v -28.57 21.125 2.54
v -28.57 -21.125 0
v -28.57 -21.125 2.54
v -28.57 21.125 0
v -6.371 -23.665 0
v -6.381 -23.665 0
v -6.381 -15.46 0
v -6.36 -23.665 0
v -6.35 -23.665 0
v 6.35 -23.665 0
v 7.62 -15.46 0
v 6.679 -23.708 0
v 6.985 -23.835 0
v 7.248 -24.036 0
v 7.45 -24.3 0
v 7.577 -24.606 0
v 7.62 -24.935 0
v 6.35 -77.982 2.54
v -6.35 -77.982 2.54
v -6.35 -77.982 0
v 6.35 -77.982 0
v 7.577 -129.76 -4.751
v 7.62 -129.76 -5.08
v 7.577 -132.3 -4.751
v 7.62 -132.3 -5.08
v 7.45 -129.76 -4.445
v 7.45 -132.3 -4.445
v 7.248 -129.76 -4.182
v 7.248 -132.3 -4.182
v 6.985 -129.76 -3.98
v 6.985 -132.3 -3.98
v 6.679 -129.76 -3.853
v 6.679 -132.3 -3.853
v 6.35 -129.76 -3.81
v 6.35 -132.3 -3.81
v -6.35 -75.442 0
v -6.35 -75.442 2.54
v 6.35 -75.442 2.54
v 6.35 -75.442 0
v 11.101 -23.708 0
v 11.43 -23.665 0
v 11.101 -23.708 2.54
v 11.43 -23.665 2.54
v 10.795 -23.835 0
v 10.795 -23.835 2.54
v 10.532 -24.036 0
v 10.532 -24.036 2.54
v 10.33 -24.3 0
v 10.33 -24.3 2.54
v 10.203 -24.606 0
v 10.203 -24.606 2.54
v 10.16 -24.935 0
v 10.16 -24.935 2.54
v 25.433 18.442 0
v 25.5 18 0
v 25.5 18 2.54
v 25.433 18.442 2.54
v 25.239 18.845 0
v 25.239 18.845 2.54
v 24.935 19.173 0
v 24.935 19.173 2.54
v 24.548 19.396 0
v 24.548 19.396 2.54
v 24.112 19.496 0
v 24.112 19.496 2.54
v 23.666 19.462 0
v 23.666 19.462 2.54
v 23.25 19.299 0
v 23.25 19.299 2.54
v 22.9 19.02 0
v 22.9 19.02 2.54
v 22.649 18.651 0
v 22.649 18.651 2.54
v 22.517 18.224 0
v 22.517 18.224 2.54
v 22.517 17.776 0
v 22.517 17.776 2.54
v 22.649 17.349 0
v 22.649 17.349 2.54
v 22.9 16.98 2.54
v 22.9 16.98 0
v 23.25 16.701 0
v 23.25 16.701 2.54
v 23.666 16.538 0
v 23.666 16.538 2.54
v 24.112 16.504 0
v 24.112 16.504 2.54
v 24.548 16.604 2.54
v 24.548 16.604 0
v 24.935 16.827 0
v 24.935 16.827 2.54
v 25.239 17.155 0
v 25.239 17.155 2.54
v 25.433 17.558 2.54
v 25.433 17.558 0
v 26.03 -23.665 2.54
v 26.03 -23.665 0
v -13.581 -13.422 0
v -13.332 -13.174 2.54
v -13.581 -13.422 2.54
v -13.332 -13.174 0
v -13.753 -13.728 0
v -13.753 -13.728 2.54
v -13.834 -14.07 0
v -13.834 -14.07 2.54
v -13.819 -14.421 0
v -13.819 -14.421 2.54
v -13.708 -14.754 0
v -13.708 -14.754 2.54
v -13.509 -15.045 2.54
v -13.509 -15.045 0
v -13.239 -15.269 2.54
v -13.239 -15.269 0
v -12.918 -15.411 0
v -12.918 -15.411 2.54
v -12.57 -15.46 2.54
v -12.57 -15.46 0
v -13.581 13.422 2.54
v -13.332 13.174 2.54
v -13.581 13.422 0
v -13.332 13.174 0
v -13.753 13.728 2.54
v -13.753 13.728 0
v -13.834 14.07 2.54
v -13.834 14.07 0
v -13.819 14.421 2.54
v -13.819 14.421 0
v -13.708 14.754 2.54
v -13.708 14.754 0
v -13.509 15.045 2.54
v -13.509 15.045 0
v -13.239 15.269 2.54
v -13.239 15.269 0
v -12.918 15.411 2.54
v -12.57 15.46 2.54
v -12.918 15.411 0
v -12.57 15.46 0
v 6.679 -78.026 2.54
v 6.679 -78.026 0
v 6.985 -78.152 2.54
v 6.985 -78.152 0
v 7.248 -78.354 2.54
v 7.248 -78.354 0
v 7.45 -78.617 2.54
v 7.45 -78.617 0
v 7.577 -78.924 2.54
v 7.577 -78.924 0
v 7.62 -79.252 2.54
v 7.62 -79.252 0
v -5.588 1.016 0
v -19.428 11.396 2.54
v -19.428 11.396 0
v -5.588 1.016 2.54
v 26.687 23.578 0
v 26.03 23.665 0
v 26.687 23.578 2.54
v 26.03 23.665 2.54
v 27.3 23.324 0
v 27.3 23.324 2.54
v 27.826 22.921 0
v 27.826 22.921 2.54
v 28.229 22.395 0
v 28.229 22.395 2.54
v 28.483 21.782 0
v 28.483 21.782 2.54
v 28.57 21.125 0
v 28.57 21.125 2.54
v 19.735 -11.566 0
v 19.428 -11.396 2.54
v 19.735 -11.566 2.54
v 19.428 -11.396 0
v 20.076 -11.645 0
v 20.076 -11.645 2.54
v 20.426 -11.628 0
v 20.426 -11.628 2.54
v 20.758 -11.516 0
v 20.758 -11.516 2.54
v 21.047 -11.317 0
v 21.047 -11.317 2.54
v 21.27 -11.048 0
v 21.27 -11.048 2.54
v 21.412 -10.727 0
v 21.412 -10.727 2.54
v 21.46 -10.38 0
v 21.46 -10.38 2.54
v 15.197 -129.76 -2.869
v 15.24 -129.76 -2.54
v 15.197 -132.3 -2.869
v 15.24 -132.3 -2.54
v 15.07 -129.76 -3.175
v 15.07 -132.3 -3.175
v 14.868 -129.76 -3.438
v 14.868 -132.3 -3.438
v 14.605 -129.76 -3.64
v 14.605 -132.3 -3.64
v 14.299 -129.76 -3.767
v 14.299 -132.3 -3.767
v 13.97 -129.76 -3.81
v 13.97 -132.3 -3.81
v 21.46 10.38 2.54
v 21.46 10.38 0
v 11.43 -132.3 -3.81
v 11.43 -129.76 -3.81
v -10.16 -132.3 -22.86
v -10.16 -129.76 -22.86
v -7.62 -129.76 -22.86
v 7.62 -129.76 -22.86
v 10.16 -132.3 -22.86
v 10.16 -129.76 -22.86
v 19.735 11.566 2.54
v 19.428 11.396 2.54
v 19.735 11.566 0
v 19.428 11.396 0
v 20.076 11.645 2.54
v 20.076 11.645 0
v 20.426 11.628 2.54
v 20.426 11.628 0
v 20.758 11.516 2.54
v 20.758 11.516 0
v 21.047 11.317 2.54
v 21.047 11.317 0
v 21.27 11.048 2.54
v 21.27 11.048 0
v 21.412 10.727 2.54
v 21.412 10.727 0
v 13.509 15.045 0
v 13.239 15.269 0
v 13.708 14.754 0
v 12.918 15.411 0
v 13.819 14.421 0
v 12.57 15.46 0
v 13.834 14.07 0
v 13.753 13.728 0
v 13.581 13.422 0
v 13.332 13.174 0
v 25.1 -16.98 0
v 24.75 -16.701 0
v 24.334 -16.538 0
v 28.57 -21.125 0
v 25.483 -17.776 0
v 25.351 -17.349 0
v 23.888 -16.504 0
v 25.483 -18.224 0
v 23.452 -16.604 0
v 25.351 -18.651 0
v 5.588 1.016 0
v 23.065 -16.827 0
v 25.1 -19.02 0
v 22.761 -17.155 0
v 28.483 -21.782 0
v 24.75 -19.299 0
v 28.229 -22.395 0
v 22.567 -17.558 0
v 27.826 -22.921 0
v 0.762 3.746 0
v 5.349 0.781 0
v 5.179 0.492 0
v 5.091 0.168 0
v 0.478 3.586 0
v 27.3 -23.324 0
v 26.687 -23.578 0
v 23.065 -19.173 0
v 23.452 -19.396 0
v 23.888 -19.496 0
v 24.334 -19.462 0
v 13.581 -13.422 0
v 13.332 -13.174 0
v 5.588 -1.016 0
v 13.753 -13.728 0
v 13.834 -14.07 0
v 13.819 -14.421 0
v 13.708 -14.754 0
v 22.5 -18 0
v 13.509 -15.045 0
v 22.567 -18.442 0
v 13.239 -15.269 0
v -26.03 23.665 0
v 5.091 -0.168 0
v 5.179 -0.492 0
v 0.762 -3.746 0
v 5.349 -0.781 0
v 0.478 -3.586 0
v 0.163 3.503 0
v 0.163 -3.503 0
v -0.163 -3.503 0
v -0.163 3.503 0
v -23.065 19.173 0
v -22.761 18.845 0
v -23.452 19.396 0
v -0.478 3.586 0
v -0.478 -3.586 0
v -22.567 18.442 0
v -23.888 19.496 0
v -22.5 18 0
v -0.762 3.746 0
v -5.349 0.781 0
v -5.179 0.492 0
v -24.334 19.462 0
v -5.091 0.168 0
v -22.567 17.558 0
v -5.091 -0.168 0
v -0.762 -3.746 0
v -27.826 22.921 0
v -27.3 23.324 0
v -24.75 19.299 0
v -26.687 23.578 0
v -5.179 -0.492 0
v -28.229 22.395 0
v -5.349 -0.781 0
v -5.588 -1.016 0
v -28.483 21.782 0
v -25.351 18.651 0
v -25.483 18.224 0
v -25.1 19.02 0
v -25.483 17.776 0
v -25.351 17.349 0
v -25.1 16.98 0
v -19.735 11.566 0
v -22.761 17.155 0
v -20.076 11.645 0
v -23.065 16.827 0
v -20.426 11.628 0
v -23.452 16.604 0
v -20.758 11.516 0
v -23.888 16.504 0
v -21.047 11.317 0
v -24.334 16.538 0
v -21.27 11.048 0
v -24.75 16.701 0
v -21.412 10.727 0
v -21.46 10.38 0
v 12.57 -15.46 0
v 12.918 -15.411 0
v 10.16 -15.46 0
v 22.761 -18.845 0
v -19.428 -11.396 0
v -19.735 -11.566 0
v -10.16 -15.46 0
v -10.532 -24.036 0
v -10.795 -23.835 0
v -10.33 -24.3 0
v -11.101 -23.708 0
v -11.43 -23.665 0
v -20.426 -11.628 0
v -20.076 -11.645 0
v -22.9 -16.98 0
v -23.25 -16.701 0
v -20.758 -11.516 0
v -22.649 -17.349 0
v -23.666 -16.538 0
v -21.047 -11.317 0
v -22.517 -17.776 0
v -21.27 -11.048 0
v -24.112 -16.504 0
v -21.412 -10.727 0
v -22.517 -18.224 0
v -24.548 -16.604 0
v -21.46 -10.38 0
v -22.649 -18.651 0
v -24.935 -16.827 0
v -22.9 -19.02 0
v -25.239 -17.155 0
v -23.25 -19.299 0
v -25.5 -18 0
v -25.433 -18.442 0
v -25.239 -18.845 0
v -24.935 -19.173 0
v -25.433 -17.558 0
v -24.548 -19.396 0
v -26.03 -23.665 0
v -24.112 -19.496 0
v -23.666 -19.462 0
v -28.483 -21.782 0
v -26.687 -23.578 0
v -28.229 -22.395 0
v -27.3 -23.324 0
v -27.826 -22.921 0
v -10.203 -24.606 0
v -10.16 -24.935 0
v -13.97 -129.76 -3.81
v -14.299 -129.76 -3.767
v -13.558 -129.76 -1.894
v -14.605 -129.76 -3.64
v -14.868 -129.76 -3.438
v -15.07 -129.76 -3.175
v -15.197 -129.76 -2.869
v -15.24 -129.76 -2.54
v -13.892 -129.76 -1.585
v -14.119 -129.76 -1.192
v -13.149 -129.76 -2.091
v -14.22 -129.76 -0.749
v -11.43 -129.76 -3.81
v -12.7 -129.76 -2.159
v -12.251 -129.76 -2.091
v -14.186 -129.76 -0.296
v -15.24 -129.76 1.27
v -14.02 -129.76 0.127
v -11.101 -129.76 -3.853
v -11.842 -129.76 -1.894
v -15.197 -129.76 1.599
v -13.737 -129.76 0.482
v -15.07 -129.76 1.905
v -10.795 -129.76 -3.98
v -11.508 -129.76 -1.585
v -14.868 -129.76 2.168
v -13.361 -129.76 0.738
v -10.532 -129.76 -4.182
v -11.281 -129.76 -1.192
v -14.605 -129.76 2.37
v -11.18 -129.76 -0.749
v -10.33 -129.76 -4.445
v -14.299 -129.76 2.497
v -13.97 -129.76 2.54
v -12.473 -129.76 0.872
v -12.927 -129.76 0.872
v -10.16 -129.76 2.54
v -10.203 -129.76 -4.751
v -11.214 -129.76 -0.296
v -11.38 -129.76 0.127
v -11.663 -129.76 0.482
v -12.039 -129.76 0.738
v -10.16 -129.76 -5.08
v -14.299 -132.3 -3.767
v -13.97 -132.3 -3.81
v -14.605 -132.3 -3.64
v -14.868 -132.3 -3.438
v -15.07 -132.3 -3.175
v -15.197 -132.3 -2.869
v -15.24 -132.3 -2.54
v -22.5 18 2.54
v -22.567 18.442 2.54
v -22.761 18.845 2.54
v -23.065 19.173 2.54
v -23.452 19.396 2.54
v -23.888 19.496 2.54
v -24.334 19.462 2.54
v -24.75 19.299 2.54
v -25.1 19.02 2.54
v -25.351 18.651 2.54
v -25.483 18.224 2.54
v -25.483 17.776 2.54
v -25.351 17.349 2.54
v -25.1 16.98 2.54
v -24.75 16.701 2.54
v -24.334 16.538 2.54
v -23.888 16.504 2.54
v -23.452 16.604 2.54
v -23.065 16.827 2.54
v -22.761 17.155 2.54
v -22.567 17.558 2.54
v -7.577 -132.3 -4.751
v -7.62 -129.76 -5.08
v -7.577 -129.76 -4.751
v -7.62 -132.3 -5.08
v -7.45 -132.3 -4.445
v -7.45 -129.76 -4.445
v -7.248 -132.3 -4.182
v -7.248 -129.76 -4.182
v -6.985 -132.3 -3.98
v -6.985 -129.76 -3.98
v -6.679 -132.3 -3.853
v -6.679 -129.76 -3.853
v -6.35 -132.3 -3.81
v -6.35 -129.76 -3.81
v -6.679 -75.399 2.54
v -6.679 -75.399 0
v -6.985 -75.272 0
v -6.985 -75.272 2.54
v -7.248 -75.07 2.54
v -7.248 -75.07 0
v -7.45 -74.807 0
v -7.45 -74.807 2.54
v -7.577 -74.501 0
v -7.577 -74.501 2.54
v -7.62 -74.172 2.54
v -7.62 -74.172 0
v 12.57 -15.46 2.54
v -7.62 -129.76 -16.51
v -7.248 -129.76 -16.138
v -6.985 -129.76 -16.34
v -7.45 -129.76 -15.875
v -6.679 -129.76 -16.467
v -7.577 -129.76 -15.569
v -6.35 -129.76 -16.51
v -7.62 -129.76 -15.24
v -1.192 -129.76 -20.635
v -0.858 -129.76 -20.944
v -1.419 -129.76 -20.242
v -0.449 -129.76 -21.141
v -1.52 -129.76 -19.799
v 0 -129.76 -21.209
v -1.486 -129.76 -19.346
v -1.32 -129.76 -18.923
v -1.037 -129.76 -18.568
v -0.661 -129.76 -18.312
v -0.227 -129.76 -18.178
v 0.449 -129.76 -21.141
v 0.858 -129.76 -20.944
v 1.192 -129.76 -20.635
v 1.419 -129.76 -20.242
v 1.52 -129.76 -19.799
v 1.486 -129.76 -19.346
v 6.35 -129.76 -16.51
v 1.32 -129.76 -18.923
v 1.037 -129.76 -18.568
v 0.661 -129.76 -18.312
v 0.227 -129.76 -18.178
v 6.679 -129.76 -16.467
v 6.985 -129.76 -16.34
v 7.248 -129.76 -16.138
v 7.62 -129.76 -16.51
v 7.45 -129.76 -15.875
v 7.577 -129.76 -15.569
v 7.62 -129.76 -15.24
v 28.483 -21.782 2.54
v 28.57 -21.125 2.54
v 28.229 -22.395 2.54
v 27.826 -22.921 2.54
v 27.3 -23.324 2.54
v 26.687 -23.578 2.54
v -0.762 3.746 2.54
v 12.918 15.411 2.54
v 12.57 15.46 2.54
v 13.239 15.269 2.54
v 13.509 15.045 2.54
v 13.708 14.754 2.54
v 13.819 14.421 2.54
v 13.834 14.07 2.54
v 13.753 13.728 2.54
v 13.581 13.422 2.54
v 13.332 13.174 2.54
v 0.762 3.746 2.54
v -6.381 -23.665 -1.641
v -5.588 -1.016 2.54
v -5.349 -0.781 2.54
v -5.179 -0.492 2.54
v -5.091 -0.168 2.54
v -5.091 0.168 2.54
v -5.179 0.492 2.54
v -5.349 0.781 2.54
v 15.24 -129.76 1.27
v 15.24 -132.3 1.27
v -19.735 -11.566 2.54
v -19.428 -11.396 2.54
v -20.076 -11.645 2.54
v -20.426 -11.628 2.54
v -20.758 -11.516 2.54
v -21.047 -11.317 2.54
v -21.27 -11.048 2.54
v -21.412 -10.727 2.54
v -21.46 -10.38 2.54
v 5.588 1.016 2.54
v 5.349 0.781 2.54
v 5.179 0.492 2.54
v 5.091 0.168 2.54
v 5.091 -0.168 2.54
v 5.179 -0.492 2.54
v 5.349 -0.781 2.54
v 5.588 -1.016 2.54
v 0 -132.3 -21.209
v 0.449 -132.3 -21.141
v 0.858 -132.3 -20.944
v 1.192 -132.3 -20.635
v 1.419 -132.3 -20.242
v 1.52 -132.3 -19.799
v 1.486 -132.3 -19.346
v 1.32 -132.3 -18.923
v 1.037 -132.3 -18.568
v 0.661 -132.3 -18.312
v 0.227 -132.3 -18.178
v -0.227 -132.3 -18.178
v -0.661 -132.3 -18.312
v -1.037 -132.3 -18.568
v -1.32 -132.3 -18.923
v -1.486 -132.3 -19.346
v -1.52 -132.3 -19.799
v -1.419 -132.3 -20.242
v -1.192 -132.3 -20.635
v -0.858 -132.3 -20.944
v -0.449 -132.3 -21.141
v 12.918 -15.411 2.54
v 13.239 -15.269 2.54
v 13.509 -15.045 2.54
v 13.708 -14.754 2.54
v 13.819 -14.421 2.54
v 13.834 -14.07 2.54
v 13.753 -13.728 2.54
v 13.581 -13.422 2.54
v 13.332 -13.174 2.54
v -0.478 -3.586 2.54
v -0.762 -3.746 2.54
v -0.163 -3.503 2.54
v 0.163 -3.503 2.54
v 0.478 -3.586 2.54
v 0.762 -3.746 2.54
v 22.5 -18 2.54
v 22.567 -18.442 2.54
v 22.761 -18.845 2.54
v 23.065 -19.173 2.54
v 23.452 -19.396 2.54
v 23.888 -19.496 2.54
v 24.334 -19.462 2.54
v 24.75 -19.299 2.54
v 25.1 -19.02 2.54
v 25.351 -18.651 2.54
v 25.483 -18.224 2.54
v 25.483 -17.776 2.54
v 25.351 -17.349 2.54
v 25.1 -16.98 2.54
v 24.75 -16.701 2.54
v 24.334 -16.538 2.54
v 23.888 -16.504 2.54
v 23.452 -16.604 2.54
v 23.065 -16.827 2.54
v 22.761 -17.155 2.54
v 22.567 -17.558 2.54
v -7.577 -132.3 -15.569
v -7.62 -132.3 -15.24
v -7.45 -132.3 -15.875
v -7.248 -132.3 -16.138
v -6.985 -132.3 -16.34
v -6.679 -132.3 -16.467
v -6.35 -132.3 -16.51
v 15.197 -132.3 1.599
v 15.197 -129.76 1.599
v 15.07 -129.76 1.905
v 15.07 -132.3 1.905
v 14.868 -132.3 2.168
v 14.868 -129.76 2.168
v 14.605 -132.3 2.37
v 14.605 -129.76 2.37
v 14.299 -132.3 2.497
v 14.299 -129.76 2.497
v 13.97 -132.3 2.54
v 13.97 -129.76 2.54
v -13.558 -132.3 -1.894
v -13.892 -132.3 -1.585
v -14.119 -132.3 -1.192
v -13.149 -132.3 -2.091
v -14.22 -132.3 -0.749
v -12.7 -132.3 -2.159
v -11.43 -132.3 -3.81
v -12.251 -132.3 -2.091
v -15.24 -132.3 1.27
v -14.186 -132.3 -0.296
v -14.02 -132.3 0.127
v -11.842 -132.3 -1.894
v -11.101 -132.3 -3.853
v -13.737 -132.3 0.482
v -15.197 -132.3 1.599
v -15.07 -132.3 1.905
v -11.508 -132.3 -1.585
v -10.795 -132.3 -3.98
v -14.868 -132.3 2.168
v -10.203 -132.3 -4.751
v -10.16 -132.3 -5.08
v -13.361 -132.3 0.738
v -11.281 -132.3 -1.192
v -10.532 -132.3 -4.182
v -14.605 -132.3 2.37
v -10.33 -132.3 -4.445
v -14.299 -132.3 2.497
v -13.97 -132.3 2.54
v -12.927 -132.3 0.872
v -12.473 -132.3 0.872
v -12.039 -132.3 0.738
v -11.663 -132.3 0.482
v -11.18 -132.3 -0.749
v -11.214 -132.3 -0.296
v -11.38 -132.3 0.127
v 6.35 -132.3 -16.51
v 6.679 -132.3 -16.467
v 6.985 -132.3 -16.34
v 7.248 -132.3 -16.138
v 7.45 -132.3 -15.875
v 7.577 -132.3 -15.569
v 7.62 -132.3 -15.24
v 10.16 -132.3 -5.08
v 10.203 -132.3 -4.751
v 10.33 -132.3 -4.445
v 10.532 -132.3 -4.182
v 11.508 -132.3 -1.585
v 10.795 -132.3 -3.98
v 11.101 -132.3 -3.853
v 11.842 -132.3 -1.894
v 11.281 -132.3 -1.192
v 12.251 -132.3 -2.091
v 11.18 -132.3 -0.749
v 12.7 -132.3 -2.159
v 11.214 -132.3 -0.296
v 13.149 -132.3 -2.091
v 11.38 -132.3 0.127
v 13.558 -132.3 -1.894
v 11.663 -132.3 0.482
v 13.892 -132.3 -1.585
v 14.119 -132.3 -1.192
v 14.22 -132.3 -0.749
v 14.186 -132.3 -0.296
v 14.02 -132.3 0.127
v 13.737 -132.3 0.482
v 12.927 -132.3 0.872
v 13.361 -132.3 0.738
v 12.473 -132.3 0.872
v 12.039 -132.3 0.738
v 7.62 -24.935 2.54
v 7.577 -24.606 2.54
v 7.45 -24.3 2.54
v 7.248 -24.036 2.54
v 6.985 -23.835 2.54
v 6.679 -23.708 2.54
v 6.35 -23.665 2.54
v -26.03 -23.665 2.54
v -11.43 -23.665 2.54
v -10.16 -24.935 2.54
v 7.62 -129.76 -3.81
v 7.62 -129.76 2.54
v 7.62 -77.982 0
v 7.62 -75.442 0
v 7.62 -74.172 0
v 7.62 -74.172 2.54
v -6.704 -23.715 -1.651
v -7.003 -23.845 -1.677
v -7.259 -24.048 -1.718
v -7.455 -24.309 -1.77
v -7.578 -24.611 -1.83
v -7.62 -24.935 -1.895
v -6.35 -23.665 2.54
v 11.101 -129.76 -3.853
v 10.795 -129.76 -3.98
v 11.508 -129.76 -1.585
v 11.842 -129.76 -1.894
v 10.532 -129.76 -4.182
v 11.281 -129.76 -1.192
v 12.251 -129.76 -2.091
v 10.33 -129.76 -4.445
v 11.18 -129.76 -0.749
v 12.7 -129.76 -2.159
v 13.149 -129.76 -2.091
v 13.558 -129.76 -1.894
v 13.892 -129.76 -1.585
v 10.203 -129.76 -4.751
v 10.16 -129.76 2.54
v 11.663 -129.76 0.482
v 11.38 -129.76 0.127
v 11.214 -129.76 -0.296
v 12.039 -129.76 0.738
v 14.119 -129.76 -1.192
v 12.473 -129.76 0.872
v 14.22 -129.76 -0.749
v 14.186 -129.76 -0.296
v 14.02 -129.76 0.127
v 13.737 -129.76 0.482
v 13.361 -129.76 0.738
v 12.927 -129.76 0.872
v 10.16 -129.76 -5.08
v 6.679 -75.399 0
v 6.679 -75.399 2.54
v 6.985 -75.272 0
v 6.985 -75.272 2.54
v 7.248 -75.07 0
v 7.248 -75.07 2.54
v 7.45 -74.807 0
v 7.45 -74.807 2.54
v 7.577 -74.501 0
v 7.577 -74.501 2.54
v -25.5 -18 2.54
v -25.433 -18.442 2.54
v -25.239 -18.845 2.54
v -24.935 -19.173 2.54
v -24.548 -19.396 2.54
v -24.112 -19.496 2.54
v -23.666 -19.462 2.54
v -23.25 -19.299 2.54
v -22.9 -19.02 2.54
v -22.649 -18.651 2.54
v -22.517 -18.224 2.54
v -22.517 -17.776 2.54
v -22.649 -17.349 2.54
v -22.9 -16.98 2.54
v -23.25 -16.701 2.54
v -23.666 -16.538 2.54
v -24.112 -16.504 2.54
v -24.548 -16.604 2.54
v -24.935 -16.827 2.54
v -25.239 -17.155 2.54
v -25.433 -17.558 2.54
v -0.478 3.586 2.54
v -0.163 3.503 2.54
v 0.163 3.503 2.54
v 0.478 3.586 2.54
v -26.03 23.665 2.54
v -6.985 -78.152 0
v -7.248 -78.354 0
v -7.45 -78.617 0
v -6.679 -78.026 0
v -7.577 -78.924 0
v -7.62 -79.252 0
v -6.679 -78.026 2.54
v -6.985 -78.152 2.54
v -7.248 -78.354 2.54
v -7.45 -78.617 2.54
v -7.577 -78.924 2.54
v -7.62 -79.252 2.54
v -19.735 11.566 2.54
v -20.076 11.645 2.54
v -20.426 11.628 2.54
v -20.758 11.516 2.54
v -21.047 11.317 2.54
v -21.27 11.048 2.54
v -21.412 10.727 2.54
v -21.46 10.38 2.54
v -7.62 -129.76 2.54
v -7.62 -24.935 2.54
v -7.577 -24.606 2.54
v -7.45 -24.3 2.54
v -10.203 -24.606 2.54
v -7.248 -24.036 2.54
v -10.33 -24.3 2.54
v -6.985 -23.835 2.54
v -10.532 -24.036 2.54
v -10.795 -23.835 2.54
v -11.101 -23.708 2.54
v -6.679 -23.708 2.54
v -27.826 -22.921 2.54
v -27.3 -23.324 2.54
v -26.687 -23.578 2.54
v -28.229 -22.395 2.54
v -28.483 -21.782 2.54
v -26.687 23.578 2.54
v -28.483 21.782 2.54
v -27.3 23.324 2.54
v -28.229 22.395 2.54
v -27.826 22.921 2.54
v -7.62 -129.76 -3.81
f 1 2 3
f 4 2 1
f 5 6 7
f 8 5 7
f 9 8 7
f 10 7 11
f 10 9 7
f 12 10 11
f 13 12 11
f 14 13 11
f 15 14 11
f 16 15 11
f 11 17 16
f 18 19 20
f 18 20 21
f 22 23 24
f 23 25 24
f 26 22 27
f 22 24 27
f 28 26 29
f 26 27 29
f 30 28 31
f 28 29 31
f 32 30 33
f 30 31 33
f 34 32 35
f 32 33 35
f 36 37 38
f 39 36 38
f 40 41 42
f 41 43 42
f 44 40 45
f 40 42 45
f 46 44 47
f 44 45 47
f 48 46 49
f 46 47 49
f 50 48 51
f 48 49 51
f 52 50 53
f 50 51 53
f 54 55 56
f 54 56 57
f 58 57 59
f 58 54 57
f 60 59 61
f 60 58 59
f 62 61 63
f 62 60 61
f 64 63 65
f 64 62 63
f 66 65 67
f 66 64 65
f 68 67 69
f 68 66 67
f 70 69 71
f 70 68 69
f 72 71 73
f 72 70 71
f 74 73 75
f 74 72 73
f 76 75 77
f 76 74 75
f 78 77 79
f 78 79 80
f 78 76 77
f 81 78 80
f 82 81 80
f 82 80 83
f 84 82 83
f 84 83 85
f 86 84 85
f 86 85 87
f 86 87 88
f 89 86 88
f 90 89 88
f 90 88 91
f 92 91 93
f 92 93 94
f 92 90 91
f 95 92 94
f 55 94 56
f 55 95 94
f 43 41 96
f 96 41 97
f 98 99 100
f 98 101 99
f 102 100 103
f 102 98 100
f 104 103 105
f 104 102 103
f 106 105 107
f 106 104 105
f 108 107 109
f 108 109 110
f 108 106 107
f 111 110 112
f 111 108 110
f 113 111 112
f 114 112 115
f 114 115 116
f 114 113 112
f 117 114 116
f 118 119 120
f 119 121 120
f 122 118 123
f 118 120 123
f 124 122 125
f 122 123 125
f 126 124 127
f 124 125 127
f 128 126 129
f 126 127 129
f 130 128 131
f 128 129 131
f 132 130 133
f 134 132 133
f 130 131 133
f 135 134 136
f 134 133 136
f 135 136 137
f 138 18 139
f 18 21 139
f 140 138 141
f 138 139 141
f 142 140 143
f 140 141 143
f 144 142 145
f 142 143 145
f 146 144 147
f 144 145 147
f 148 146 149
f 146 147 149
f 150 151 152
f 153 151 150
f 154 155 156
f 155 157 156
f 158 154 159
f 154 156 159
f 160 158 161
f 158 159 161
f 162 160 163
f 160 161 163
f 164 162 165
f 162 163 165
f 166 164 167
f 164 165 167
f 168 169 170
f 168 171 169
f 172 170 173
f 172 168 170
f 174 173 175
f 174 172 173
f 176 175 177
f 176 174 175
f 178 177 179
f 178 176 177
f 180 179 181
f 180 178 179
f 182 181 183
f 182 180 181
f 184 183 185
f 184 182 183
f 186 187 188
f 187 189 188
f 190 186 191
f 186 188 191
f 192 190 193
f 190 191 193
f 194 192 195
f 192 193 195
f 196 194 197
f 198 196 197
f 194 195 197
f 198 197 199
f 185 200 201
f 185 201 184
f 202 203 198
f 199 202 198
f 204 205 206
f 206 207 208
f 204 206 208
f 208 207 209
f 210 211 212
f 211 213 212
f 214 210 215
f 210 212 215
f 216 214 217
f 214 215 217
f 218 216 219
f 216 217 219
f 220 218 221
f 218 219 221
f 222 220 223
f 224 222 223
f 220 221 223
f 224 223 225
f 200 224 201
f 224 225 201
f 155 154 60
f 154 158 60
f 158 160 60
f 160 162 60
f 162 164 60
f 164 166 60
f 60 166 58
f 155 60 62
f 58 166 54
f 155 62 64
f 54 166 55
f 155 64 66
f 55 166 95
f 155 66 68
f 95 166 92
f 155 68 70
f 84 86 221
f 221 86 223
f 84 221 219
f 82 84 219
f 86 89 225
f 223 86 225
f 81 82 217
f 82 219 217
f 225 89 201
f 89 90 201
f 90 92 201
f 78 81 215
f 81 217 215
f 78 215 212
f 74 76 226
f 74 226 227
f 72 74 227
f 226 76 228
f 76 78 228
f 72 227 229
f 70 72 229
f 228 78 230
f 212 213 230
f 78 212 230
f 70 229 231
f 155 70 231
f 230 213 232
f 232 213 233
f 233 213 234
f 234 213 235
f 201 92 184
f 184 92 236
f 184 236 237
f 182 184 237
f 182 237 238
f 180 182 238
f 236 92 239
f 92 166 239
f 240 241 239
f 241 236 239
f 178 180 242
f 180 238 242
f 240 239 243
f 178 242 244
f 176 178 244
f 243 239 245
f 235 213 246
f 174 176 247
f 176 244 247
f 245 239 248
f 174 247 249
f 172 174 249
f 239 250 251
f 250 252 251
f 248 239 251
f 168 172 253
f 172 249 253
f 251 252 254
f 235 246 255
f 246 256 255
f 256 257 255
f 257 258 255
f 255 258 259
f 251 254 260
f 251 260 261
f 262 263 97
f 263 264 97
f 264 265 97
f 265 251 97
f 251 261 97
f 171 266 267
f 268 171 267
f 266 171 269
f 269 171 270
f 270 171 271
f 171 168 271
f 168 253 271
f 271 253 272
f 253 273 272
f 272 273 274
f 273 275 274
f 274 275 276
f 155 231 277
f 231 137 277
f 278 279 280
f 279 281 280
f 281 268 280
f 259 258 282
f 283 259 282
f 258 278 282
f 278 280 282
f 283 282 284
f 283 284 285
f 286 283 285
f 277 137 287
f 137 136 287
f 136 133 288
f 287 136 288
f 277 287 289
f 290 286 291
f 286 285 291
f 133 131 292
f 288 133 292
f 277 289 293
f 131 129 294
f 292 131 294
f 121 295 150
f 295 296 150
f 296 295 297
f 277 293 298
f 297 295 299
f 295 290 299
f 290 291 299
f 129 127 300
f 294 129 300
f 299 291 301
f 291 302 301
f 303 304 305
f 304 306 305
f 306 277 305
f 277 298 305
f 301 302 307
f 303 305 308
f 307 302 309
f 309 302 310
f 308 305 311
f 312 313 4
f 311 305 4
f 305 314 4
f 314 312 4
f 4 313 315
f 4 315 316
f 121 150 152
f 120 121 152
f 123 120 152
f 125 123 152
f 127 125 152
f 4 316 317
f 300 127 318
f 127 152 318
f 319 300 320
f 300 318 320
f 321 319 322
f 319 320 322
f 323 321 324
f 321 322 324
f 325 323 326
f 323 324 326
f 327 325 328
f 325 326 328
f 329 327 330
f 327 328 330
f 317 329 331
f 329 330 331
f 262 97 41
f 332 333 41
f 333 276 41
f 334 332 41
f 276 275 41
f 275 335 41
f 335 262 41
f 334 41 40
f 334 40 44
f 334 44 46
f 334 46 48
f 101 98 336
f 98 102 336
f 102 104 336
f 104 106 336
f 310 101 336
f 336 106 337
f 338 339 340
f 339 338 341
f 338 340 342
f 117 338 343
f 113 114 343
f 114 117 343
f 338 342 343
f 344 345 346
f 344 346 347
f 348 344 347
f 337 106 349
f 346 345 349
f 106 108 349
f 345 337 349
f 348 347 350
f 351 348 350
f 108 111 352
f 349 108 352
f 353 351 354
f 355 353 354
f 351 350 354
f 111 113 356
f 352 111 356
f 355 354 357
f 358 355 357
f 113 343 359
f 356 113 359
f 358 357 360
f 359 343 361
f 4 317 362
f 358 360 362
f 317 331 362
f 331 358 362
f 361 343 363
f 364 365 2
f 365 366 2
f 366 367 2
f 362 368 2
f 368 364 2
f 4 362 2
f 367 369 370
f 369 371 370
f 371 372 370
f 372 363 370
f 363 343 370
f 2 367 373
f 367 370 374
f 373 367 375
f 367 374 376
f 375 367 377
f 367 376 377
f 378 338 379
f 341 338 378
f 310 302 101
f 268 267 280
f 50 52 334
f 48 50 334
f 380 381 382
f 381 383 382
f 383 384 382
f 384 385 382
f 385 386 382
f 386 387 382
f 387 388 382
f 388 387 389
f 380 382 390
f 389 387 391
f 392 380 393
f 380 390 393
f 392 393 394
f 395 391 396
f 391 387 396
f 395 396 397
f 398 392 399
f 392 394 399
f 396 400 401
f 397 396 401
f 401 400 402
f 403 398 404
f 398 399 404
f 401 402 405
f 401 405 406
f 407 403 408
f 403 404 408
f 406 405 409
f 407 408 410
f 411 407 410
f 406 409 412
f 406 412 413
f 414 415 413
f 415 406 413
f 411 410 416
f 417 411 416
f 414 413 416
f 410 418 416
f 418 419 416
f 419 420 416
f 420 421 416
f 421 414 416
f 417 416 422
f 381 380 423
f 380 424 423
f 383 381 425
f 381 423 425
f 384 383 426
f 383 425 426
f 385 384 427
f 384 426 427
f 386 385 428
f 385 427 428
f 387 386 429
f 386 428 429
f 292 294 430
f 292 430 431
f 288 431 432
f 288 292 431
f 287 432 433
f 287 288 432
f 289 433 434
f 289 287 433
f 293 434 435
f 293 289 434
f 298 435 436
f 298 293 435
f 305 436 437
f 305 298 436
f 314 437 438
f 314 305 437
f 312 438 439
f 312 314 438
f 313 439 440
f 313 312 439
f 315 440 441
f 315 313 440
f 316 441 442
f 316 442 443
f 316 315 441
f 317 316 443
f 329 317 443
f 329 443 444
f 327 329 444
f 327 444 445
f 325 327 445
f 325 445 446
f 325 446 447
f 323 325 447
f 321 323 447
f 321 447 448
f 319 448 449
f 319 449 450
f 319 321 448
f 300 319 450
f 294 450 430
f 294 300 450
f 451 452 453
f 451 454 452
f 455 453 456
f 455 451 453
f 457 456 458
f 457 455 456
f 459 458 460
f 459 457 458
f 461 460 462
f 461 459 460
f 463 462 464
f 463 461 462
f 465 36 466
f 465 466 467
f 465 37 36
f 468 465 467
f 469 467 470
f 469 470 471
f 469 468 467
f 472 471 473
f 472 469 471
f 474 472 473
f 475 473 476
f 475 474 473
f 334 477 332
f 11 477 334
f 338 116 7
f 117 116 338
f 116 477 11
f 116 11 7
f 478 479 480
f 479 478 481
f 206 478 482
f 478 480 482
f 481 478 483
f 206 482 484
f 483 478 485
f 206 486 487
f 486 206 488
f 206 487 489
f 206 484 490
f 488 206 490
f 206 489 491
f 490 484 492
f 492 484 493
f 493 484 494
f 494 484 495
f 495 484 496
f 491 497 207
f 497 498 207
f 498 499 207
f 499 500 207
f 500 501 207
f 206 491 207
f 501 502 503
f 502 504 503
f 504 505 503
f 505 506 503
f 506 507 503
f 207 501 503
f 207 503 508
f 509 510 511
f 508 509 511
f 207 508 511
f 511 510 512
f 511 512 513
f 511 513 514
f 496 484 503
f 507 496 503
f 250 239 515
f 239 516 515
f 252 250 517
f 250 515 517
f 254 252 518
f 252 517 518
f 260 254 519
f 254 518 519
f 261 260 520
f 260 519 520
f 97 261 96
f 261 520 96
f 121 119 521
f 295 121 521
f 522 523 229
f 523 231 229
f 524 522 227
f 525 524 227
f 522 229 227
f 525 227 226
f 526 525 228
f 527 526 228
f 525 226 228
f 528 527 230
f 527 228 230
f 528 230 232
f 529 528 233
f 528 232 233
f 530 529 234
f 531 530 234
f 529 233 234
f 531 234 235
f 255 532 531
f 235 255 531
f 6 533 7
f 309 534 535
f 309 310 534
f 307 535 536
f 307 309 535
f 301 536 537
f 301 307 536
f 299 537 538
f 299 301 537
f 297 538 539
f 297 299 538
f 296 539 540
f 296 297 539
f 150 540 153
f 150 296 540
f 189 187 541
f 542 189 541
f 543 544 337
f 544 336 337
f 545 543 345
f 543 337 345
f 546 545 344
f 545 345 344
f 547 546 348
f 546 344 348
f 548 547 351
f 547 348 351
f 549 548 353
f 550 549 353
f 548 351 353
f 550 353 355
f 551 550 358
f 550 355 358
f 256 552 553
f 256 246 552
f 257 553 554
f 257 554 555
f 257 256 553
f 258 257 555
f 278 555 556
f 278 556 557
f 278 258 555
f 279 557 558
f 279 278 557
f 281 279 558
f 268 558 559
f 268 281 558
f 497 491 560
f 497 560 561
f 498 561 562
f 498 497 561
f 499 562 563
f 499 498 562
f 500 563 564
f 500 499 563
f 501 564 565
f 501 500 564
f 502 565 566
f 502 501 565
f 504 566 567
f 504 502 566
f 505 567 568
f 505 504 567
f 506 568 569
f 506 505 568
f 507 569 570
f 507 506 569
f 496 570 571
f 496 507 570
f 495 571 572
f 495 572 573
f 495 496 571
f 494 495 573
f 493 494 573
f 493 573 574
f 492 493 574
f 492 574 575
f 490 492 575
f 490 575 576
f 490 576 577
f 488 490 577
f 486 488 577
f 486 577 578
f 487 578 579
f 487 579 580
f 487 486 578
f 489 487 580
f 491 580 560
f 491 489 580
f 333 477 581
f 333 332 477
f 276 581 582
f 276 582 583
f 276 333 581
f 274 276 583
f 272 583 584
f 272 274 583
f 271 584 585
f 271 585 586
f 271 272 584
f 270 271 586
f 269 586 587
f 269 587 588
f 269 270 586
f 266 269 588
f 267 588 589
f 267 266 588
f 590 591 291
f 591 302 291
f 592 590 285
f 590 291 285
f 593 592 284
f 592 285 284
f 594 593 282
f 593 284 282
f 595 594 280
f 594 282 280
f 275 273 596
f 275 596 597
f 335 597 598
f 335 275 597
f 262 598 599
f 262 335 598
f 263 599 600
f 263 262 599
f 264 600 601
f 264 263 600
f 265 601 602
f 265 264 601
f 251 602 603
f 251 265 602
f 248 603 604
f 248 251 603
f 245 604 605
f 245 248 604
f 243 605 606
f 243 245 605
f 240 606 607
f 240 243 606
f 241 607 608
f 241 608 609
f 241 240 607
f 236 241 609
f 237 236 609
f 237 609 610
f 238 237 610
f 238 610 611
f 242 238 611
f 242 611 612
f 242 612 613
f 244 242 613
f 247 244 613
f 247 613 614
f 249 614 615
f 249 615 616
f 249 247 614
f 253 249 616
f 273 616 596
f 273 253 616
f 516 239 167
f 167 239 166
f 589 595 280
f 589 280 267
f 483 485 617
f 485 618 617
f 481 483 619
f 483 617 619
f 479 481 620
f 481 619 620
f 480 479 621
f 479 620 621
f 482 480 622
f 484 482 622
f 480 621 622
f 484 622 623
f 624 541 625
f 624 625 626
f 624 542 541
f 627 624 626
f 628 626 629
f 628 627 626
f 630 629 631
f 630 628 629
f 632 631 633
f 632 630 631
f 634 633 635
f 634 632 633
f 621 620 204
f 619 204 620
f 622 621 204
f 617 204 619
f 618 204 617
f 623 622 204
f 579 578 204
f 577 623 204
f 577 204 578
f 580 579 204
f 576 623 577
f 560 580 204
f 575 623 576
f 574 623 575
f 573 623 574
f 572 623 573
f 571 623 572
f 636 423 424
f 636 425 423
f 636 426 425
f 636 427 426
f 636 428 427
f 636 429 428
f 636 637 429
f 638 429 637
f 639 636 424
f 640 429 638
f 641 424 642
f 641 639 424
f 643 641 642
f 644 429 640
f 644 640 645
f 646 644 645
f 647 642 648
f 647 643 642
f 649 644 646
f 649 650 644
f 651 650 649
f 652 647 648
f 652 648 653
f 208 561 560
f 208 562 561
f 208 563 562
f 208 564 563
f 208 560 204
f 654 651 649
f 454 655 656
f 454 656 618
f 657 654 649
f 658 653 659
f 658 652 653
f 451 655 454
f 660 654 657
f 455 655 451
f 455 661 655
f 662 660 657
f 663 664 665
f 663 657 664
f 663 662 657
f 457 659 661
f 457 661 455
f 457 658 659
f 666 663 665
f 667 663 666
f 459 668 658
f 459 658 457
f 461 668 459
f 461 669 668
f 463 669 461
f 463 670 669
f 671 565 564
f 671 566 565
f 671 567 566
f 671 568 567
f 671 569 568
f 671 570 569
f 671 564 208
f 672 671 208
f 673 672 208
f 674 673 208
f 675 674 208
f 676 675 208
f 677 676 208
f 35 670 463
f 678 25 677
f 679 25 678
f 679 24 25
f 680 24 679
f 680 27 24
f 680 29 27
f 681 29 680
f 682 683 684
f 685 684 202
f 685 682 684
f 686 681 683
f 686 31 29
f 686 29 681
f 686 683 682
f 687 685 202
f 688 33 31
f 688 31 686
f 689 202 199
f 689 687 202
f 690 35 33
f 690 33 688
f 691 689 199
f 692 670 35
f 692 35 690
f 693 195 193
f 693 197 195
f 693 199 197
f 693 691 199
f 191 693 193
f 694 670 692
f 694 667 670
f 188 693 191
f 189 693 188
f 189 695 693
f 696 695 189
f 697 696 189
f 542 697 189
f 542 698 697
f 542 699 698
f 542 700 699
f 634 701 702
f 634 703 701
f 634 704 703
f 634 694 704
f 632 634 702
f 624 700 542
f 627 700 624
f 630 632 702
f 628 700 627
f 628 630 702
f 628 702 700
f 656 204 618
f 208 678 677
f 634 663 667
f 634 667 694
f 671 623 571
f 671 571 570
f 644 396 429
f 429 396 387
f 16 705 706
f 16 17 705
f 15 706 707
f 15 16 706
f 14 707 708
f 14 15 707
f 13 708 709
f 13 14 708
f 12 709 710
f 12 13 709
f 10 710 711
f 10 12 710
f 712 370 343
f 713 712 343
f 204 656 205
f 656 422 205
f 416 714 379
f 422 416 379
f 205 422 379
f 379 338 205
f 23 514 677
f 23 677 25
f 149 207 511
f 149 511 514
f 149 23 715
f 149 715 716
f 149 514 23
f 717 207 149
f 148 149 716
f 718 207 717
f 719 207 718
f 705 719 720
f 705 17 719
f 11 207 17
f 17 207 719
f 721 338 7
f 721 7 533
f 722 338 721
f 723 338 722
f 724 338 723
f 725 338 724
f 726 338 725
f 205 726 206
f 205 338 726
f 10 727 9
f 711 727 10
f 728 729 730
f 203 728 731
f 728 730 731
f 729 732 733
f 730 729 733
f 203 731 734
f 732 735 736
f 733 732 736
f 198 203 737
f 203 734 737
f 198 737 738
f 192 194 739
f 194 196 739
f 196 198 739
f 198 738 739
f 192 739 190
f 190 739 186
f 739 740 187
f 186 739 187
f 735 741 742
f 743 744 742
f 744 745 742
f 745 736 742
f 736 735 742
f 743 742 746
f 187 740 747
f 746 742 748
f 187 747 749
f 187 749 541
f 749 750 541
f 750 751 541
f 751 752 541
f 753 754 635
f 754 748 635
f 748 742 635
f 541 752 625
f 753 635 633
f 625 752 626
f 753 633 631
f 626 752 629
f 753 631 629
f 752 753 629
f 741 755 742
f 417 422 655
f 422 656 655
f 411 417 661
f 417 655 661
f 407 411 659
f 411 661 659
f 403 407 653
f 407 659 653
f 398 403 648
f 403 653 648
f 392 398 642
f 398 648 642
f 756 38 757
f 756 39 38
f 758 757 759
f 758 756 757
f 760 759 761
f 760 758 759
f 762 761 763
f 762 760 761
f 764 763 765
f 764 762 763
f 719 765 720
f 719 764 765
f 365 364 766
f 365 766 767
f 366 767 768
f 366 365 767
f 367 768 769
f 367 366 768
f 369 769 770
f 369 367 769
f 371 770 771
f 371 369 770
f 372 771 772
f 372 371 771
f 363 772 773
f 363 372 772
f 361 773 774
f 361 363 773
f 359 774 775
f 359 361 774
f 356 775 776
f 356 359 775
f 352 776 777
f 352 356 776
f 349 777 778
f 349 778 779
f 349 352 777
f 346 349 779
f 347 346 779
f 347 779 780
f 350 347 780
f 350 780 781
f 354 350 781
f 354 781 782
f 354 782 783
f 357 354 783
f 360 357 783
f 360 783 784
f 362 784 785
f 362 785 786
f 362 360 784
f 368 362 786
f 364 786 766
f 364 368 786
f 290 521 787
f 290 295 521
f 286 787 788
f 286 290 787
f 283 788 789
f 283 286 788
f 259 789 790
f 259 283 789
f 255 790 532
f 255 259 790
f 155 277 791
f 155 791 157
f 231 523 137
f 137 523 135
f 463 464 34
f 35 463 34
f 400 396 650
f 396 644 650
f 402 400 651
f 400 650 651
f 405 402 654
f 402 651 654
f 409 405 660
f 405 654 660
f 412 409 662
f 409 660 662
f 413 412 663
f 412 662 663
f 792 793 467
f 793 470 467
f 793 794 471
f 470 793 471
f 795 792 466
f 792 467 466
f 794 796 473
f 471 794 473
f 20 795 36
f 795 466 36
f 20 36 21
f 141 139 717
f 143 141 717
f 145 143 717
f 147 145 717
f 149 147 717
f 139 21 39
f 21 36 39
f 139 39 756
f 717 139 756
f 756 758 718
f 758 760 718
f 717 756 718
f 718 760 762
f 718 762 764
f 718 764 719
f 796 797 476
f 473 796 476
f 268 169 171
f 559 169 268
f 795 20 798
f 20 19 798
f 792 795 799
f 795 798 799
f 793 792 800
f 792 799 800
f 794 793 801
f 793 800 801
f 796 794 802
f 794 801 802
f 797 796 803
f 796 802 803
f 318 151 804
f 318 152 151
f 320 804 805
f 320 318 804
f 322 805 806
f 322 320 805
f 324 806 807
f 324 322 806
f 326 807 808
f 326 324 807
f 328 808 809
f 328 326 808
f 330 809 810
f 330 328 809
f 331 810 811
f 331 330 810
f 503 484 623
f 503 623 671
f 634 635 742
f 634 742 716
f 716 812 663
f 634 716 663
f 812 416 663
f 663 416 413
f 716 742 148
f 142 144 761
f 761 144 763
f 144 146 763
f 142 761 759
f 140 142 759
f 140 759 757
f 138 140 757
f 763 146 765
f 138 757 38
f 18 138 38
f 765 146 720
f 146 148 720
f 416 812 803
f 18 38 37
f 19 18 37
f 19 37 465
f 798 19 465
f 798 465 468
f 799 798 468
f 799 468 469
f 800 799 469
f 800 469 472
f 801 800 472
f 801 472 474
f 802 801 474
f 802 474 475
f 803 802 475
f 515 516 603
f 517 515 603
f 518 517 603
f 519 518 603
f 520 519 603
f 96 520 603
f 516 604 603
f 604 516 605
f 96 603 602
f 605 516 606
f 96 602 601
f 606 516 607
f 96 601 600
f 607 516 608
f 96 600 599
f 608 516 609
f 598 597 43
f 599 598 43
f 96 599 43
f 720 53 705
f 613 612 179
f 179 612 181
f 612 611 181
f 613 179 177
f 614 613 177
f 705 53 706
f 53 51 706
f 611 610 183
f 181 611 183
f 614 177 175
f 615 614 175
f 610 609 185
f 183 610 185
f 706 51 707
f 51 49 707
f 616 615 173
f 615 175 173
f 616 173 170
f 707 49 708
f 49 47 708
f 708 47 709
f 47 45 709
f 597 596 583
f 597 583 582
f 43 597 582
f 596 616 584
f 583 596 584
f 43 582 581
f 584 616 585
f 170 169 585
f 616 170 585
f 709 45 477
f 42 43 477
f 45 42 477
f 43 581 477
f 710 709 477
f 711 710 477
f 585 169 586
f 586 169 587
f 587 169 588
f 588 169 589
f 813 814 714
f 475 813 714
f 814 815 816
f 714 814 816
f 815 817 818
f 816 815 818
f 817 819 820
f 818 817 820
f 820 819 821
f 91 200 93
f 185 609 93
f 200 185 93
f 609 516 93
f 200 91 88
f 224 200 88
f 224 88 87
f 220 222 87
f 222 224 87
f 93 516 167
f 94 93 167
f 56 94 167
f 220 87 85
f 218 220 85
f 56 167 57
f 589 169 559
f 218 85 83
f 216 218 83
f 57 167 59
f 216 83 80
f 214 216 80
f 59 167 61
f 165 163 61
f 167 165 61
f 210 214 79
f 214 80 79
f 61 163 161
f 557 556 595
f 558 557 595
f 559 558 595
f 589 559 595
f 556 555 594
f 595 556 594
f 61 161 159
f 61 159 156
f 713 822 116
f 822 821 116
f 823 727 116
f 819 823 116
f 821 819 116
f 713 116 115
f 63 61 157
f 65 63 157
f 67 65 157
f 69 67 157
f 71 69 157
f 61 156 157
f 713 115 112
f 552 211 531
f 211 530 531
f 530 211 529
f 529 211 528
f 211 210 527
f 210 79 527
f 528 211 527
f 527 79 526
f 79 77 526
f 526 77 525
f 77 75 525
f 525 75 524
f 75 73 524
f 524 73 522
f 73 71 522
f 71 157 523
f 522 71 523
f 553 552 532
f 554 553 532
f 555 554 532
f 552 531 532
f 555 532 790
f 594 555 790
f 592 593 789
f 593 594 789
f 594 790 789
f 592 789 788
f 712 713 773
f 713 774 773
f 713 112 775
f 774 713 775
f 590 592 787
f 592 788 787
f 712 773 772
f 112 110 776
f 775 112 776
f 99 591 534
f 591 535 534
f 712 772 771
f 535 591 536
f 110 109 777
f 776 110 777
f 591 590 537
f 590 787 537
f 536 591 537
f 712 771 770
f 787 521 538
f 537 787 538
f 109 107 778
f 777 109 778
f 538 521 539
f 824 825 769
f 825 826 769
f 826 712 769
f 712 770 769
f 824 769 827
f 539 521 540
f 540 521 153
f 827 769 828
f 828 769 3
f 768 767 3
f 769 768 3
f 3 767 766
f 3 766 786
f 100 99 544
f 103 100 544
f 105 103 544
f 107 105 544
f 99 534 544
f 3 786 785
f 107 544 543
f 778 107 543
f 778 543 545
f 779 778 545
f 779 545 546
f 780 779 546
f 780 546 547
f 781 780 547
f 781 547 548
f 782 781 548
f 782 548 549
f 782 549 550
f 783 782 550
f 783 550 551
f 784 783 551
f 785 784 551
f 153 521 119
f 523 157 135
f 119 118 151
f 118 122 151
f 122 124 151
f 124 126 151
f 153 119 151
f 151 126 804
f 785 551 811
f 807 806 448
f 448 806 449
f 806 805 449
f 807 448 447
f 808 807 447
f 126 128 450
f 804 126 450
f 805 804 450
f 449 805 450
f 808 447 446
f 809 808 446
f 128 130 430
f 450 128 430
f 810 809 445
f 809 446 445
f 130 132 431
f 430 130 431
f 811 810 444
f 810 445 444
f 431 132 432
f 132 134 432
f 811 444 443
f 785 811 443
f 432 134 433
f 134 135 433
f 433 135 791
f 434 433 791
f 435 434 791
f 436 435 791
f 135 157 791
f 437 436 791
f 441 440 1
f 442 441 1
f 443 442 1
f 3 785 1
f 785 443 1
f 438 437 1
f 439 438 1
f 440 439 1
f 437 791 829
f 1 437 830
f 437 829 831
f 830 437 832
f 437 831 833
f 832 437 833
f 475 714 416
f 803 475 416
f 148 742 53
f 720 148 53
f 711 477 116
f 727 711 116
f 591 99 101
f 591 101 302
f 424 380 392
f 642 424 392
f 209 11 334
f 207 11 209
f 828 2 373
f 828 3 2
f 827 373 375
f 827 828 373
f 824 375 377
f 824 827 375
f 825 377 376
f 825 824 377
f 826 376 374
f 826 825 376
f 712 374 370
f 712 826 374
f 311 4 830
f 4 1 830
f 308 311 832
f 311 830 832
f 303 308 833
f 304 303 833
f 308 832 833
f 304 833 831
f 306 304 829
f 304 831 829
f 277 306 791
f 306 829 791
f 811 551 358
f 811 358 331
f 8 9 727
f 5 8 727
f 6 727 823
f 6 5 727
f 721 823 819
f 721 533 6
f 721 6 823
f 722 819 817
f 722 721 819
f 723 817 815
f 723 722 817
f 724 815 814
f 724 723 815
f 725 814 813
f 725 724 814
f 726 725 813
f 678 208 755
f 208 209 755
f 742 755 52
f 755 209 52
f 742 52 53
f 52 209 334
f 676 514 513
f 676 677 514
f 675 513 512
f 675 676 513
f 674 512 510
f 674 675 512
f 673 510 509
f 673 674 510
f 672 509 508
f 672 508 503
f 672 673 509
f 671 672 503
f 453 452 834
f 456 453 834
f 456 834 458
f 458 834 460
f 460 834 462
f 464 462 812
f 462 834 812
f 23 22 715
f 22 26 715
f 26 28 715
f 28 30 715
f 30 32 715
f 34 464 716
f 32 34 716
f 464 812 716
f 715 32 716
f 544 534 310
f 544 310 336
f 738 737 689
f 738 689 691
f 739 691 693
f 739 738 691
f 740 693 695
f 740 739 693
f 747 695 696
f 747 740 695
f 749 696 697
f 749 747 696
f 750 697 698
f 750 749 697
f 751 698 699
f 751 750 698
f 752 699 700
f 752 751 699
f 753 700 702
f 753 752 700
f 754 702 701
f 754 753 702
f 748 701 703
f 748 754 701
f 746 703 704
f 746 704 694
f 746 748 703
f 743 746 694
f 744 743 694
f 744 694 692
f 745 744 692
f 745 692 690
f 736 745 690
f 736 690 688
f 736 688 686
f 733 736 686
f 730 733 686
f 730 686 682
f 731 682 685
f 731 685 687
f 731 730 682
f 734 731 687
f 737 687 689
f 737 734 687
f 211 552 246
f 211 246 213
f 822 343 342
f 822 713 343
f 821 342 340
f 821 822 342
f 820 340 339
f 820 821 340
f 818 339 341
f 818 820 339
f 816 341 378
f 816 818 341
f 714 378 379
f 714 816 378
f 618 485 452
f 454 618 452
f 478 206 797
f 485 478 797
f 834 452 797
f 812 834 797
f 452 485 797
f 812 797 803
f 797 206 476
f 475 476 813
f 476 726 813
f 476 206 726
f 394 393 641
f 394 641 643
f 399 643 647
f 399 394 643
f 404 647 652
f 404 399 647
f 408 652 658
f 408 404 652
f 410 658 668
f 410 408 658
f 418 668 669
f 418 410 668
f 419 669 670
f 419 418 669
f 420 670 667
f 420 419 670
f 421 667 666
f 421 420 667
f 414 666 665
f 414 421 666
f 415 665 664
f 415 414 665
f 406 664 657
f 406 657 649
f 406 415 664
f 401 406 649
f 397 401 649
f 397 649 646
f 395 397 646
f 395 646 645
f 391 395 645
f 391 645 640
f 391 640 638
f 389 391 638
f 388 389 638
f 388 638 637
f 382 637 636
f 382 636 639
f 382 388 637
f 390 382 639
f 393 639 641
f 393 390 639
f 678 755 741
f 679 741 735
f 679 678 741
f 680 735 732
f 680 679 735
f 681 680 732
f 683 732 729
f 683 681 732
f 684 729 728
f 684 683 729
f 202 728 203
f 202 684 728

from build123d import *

# Parameters (mm, degrees)
BOSS_EXTRUDE1_DEPTH      = 2.54
CUT_EXTRUDE1_DEPTH       = 2.54
CUT_EXTRUDE3_START       = -2.54
SKETCH4_W                = 57.139047114
SKETCH4_H                = 47.329047114
CUT_EXTRUDE3_DEPTH       = 2.54
FILLET5_R                = 1.27
FILLET6_R                = 1.27
FILLET7_R                = 2.54
BOSS_EXTRUDE2_DEPTH      = 10.16
BOSS_EXTRUDE2_DEPTH_BACK = 10.16
SKETCH7_W                = 15.24
SKETCH7_H                = 106.095476443
CUT_EXTRUDE4_DEPTH       = 52.324
SKETCH8_W                = 15.24
SKETCH8_H                = 12.7
SKETCH8_R                = 1.524
BOSS_EXTRUDE3_DEPTH      = 2.54
SKETCH10_W               = 14.001226512
SKETCH10_H               = 1.640904711
CUT_EXTRUDE5_DEPTH       = 12.192
FILLET9_R                = 1.27
FILLET10_R               = 1.27
SKETCH11_W               = 15.296857303
SKETCH11_H               = 2.54
BOSS_EXTRUDE4_DEPTH      = 2.54
FILLET12_R               = 1.27


with BuildPart() as part:
    # Sketch1 → Boss-Extrude1 (new body)
    with BuildSketch(Plane(origin=(0, 0, 0), x_dir=(-1, 0, 0), z_dir=(0, 0, 1))):
        with BuildLine():
            Line((-27.900000003, -31.869047114), (27.899999998, -31.869047114))
            ThreePointArc((27.899999998, -31.869047114), (30.70654013, -30.706540129), (31.869047114, -27.899999998))
            Line((31.869047114, -27.899999998), (31.869047114, 27.899999996))
            ThreePointArc((31.869047114, 27.899999996), (30.70654013, 30.706540129), (27.899999998, 31.869047114))
            Line((27.899999998, 31.869047114), (-27.899999996, 31.869047114))
            ThreePointArc((-27.899999996, 31.869047114), (-30.706540129, 30.70654013), (-31.869047114, 27.899999998))
            Line((-31.869047114, 27.899999998), (-31.869047114, -27.900000002))
            ThreePointArc((-31.869047114, -27.900000002), (-30.70654013, -30.706540129), (-27.900000003, -31.869047114))
        make_face()
        with BuildLine():
            ThreePointArc((-25.5, 18), (-24, 16.5), (-22.5, 18))
            ThreePointArc((-22.5, 18), (-24, 19.5), (-25.5, 18))
        make_face(mode=Mode.SUBTRACT)
        with BuildLine():
            ThreePointArc((22.5, 18), (24, 16.5), (25.5, 18))
            ThreePointArc((25.5, 18), (24, 19.5), (22.5, 18))
        make_face(mode=Mode.SUBTRACT)
        with BuildLine():
            ThreePointArc((25.5, -18), (24, -16.5), (22.5, -18))
            ThreePointArc((22.5, -18), (24, -19.5), (25.5, -18))
        make_face(mode=Mode.SUBTRACT)
        with BuildLine():
            ThreePointArc((-22.5, -18), (-24, -16.5), (-25.5, -18))
            ThreePointArc((-25.5, -18), (-24, -19.5), (-22.5, -18))
        make_face(mode=Mode.SUBTRACT)
    extrude(amount=BOSS_EXTRUDE1_DEPTH)

    # Sketch2 → Cut-Extrude1 (cut)
    with BuildSketch(Plane.XY.offset(2.54)):
        Polygon((-16.38, 15.46), (0, 3.175), (16.38, 15.46), align=None)
        Polygon((21.46, 12.92), (21.46, -12.92), (4.233333333, 0), align=None)
        Polygon((-21.46, -12.92), (-21.46, 12.92), (-4.233333333, 0), align=None)
        Polygon((0, -3.175), (16.38, -15.46), (-16.38, -15.46), align=None)
    extrude(amount=-CUT_EXTRUDE1_DEPTH, mode=Mode.SUBTRACT)

    # Sketch4 → Cut-Extrude3 (cut)
    with BuildSketch(Plane.XY.offset(2.54).offset(CUT_EXTRUDE3_START)):
        with BuildLine():
            Line((27.900000003, 31.869047114), (-27.899999998, 31.869047114))
            ThreePointArc((-27.899999998, 31.869047114), (-30.70654013, 30.706540129), (-31.869047114, 27.899999998))
            Line((-31.869047114, 27.899999998), (-31.869047114, -27.899999996))
            ThreePointArc((-31.869047114, -27.899999996), (-30.70654013, -30.706540129), (-27.899999998, -31.869047114))
            Line((-27.899999998, -31.869047114), (27.899999996, -31.869047114))
            ThreePointArc((27.899999996, -31.869047114), (30.706540129, -30.70654013), (31.869047114, -27.899999998))
            Line((31.869047114, -27.899999998), (31.869047114, 27.900000002))
            ThreePointArc((31.869047114, 27.900000002), (30.70654013, 30.706540129), (27.900000003, 31.869047114))
        make_face()
        Rectangle(SKETCH4_W, SKETCH4_H, mode=Mode.SUBTRACT)
    extrude(amount=CUT_EXTRUDE3_DEPTH, mode=Mode.SUBTRACT)

    # Fillet5
    fillet5_edges = [part.edges().sort_by_distance(p)[0] for p in [
        (16.38, 15.46, 1.27),
        (-16.38, 15.46, 1.27),
        (-21.46, 12.92, 1.27),
        (-21.46, -12.92, 1.27),
        (16.38, -15.46, 1.27),
        (-16.38, -15.46, 1.27),
        (21.46, 12.92, 1.27),
        (21.46, -12.92, 1.27),
    ]]
    fillet(fillet5_edges, radius=FILLET5_R)

    # Fillet6
    fillet6_edges = [part.edges().sort_by_distance(p)[0] for p in [
        (0, 3.175, 1.27),
        (-4.233333333, 0, 1.27),
        (0, -3.175, 1.27),
        (4.233333333, 0, 1.27),
    ]]
    fillet(fillet6_edges, radius=FILLET6_R)

    # Fillet7
    fillet7_edges = [part.edges().sort_by_distance(p)[0] for p in [
        (28.569523557, -23.664523557, 1.27),
        (-28.569523557, -23.664523557, 1.27),
        (-28.569523557, 23.664523557, 1.27),
        (28.569523557, 23.664523557, 1.27),
    ]]
    fillet(fillet7_edges, radius=FILLET7_R)

    # Sketch6 → Boss-Extrude2 (add, two sides: drawn at the far end of the back side and taken through both)
    with BuildSketch(Plane(origin=(0, 0, 0), x_dir=(0, 0, -1), z_dir=(1, 0, 0)).offset(-BOSS_EXTRUDE2_DEPTH_BACK)):
        Polygon((-2.54, -129.76), (-2.54, -23.664523557), (-2.54, -15.46), (0, -15.46), (22.86, -129.76), align=None)
    extrude(amount=BOSS_EXTRUDE2_DEPTH + BOSS_EXTRUDE2_DEPTH_BACK)

    # Sketch7 → Cut-Extrude4 (cut)
    with BuildSketch(Plane.XY.offset(2.54)):
        with Locations((0, -76.712261779)):
            Rectangle(SKETCH7_W, SKETCH7_H)
    extrude(amount=-CUT_EXTRUDE4_DEPTH, mode=Mode.SUBTRACT)

    # Sketch8 → Boss-Extrude3 (add)
    with BuildSketch(Plane.XZ.offset(129.76)):
        Polygon((-15.24, 2.54), (-15.24, -3.81), (-10.16, -3.81), (-10.16, -22.86), (10.16, -22.86), (10.16, -3.81), (15.24, -3.81), (15.24, 2.54), align=None)
        with Locations((0, -10.16)):
            Rectangle(SKETCH8_W, SKETCH8_H, mode=Mode.SUBTRACT)
        with Locations(Location((-12.7, -0.635, 0), (0, 0, 270))):
            Circle(SKETCH8_R, mode=Mode.SUBTRACT)
        with Locations(Location((12.7, -0.635, 0), (0, 0, 270))):
            Circle(SKETCH8_R, mode=Mode.SUBTRACT)
        with Locations(Location((0, -19.685, 0), (0, 0, 270))):
            Circle(SKETCH8_R, mode=Mode.SUBTRACT)
    extrude(amount=BOSS_EXTRUDE3_DEPTH)

    # Sketch10 → Cut-Extrude5 (cut)
    with BuildSketch(Plane.XZ.offset(23.664523557)):
        with Locations((0.619386744, -0.820452356)):
            Rectangle(SKETCH10_W, SKETCH10_H)
    extrude(amount=-CUT_EXTRUDE5_DEPTH, mode=Mode.SUBTRACT)

    # Fillet9
    fillet9_edges = [part.edges().sort_by_distance(p)[0] for p in [
        (7.62, -23.664523557, 1.27),
        (-7.62, -23.664523557, 0.449547644),
        (-10.16, -23.664523557, 1.27),
        (10.16, -23.664523557, 1.27),
    ]]
    fillet(fillet9_edges, radius=FILLET9_R)

    # Fillet10
    fillet10_edges = [part.edges().sort_by_distance(p)[0] for p in [
        (7.62, -131.03, -3.81),
        (7.62, -131.03, -16.51),
        (-7.62, -131.03, -16.51),
        (10.16, -131.03, -3.81),
        (15.24, -131.03, -3.81),
        (15.24, -131.03, 2.54),
        (-15.24, -131.03, 2.54),
        (-15.24, -131.03, -3.81),
        (-7.62, -131.03, -3.81),
        (-10.16, -131.03, -3.81),
    ]]
    fillet(fillet10_edges, radius=FILLET10_R)

    # Sketch11 → Boss-Extrude4 (add)
    with BuildSketch(Plane.XY.offset(2.54)):
        with Locations((-0.028428652, -76.712261779)):
            Rectangle(SKETCH11_W, SKETCH11_H)
    extrude(amount=-BOSS_EXTRUDE4_DEPTH)

    # Fillet12
    fillet12_edges = [part.edges().sort_by_distance(p)[0] for p in [
        (-7.62, -75.442261779, 1.27),
        (-7.62, -77.982261779, 1.27),
        (7.62, -77.982261779, 1.27),
        (7.62, -75.442261779, 1.27),
    ]]
    fillet(fillet12_edges, radius=FILLET12_R)


solid = part.part
